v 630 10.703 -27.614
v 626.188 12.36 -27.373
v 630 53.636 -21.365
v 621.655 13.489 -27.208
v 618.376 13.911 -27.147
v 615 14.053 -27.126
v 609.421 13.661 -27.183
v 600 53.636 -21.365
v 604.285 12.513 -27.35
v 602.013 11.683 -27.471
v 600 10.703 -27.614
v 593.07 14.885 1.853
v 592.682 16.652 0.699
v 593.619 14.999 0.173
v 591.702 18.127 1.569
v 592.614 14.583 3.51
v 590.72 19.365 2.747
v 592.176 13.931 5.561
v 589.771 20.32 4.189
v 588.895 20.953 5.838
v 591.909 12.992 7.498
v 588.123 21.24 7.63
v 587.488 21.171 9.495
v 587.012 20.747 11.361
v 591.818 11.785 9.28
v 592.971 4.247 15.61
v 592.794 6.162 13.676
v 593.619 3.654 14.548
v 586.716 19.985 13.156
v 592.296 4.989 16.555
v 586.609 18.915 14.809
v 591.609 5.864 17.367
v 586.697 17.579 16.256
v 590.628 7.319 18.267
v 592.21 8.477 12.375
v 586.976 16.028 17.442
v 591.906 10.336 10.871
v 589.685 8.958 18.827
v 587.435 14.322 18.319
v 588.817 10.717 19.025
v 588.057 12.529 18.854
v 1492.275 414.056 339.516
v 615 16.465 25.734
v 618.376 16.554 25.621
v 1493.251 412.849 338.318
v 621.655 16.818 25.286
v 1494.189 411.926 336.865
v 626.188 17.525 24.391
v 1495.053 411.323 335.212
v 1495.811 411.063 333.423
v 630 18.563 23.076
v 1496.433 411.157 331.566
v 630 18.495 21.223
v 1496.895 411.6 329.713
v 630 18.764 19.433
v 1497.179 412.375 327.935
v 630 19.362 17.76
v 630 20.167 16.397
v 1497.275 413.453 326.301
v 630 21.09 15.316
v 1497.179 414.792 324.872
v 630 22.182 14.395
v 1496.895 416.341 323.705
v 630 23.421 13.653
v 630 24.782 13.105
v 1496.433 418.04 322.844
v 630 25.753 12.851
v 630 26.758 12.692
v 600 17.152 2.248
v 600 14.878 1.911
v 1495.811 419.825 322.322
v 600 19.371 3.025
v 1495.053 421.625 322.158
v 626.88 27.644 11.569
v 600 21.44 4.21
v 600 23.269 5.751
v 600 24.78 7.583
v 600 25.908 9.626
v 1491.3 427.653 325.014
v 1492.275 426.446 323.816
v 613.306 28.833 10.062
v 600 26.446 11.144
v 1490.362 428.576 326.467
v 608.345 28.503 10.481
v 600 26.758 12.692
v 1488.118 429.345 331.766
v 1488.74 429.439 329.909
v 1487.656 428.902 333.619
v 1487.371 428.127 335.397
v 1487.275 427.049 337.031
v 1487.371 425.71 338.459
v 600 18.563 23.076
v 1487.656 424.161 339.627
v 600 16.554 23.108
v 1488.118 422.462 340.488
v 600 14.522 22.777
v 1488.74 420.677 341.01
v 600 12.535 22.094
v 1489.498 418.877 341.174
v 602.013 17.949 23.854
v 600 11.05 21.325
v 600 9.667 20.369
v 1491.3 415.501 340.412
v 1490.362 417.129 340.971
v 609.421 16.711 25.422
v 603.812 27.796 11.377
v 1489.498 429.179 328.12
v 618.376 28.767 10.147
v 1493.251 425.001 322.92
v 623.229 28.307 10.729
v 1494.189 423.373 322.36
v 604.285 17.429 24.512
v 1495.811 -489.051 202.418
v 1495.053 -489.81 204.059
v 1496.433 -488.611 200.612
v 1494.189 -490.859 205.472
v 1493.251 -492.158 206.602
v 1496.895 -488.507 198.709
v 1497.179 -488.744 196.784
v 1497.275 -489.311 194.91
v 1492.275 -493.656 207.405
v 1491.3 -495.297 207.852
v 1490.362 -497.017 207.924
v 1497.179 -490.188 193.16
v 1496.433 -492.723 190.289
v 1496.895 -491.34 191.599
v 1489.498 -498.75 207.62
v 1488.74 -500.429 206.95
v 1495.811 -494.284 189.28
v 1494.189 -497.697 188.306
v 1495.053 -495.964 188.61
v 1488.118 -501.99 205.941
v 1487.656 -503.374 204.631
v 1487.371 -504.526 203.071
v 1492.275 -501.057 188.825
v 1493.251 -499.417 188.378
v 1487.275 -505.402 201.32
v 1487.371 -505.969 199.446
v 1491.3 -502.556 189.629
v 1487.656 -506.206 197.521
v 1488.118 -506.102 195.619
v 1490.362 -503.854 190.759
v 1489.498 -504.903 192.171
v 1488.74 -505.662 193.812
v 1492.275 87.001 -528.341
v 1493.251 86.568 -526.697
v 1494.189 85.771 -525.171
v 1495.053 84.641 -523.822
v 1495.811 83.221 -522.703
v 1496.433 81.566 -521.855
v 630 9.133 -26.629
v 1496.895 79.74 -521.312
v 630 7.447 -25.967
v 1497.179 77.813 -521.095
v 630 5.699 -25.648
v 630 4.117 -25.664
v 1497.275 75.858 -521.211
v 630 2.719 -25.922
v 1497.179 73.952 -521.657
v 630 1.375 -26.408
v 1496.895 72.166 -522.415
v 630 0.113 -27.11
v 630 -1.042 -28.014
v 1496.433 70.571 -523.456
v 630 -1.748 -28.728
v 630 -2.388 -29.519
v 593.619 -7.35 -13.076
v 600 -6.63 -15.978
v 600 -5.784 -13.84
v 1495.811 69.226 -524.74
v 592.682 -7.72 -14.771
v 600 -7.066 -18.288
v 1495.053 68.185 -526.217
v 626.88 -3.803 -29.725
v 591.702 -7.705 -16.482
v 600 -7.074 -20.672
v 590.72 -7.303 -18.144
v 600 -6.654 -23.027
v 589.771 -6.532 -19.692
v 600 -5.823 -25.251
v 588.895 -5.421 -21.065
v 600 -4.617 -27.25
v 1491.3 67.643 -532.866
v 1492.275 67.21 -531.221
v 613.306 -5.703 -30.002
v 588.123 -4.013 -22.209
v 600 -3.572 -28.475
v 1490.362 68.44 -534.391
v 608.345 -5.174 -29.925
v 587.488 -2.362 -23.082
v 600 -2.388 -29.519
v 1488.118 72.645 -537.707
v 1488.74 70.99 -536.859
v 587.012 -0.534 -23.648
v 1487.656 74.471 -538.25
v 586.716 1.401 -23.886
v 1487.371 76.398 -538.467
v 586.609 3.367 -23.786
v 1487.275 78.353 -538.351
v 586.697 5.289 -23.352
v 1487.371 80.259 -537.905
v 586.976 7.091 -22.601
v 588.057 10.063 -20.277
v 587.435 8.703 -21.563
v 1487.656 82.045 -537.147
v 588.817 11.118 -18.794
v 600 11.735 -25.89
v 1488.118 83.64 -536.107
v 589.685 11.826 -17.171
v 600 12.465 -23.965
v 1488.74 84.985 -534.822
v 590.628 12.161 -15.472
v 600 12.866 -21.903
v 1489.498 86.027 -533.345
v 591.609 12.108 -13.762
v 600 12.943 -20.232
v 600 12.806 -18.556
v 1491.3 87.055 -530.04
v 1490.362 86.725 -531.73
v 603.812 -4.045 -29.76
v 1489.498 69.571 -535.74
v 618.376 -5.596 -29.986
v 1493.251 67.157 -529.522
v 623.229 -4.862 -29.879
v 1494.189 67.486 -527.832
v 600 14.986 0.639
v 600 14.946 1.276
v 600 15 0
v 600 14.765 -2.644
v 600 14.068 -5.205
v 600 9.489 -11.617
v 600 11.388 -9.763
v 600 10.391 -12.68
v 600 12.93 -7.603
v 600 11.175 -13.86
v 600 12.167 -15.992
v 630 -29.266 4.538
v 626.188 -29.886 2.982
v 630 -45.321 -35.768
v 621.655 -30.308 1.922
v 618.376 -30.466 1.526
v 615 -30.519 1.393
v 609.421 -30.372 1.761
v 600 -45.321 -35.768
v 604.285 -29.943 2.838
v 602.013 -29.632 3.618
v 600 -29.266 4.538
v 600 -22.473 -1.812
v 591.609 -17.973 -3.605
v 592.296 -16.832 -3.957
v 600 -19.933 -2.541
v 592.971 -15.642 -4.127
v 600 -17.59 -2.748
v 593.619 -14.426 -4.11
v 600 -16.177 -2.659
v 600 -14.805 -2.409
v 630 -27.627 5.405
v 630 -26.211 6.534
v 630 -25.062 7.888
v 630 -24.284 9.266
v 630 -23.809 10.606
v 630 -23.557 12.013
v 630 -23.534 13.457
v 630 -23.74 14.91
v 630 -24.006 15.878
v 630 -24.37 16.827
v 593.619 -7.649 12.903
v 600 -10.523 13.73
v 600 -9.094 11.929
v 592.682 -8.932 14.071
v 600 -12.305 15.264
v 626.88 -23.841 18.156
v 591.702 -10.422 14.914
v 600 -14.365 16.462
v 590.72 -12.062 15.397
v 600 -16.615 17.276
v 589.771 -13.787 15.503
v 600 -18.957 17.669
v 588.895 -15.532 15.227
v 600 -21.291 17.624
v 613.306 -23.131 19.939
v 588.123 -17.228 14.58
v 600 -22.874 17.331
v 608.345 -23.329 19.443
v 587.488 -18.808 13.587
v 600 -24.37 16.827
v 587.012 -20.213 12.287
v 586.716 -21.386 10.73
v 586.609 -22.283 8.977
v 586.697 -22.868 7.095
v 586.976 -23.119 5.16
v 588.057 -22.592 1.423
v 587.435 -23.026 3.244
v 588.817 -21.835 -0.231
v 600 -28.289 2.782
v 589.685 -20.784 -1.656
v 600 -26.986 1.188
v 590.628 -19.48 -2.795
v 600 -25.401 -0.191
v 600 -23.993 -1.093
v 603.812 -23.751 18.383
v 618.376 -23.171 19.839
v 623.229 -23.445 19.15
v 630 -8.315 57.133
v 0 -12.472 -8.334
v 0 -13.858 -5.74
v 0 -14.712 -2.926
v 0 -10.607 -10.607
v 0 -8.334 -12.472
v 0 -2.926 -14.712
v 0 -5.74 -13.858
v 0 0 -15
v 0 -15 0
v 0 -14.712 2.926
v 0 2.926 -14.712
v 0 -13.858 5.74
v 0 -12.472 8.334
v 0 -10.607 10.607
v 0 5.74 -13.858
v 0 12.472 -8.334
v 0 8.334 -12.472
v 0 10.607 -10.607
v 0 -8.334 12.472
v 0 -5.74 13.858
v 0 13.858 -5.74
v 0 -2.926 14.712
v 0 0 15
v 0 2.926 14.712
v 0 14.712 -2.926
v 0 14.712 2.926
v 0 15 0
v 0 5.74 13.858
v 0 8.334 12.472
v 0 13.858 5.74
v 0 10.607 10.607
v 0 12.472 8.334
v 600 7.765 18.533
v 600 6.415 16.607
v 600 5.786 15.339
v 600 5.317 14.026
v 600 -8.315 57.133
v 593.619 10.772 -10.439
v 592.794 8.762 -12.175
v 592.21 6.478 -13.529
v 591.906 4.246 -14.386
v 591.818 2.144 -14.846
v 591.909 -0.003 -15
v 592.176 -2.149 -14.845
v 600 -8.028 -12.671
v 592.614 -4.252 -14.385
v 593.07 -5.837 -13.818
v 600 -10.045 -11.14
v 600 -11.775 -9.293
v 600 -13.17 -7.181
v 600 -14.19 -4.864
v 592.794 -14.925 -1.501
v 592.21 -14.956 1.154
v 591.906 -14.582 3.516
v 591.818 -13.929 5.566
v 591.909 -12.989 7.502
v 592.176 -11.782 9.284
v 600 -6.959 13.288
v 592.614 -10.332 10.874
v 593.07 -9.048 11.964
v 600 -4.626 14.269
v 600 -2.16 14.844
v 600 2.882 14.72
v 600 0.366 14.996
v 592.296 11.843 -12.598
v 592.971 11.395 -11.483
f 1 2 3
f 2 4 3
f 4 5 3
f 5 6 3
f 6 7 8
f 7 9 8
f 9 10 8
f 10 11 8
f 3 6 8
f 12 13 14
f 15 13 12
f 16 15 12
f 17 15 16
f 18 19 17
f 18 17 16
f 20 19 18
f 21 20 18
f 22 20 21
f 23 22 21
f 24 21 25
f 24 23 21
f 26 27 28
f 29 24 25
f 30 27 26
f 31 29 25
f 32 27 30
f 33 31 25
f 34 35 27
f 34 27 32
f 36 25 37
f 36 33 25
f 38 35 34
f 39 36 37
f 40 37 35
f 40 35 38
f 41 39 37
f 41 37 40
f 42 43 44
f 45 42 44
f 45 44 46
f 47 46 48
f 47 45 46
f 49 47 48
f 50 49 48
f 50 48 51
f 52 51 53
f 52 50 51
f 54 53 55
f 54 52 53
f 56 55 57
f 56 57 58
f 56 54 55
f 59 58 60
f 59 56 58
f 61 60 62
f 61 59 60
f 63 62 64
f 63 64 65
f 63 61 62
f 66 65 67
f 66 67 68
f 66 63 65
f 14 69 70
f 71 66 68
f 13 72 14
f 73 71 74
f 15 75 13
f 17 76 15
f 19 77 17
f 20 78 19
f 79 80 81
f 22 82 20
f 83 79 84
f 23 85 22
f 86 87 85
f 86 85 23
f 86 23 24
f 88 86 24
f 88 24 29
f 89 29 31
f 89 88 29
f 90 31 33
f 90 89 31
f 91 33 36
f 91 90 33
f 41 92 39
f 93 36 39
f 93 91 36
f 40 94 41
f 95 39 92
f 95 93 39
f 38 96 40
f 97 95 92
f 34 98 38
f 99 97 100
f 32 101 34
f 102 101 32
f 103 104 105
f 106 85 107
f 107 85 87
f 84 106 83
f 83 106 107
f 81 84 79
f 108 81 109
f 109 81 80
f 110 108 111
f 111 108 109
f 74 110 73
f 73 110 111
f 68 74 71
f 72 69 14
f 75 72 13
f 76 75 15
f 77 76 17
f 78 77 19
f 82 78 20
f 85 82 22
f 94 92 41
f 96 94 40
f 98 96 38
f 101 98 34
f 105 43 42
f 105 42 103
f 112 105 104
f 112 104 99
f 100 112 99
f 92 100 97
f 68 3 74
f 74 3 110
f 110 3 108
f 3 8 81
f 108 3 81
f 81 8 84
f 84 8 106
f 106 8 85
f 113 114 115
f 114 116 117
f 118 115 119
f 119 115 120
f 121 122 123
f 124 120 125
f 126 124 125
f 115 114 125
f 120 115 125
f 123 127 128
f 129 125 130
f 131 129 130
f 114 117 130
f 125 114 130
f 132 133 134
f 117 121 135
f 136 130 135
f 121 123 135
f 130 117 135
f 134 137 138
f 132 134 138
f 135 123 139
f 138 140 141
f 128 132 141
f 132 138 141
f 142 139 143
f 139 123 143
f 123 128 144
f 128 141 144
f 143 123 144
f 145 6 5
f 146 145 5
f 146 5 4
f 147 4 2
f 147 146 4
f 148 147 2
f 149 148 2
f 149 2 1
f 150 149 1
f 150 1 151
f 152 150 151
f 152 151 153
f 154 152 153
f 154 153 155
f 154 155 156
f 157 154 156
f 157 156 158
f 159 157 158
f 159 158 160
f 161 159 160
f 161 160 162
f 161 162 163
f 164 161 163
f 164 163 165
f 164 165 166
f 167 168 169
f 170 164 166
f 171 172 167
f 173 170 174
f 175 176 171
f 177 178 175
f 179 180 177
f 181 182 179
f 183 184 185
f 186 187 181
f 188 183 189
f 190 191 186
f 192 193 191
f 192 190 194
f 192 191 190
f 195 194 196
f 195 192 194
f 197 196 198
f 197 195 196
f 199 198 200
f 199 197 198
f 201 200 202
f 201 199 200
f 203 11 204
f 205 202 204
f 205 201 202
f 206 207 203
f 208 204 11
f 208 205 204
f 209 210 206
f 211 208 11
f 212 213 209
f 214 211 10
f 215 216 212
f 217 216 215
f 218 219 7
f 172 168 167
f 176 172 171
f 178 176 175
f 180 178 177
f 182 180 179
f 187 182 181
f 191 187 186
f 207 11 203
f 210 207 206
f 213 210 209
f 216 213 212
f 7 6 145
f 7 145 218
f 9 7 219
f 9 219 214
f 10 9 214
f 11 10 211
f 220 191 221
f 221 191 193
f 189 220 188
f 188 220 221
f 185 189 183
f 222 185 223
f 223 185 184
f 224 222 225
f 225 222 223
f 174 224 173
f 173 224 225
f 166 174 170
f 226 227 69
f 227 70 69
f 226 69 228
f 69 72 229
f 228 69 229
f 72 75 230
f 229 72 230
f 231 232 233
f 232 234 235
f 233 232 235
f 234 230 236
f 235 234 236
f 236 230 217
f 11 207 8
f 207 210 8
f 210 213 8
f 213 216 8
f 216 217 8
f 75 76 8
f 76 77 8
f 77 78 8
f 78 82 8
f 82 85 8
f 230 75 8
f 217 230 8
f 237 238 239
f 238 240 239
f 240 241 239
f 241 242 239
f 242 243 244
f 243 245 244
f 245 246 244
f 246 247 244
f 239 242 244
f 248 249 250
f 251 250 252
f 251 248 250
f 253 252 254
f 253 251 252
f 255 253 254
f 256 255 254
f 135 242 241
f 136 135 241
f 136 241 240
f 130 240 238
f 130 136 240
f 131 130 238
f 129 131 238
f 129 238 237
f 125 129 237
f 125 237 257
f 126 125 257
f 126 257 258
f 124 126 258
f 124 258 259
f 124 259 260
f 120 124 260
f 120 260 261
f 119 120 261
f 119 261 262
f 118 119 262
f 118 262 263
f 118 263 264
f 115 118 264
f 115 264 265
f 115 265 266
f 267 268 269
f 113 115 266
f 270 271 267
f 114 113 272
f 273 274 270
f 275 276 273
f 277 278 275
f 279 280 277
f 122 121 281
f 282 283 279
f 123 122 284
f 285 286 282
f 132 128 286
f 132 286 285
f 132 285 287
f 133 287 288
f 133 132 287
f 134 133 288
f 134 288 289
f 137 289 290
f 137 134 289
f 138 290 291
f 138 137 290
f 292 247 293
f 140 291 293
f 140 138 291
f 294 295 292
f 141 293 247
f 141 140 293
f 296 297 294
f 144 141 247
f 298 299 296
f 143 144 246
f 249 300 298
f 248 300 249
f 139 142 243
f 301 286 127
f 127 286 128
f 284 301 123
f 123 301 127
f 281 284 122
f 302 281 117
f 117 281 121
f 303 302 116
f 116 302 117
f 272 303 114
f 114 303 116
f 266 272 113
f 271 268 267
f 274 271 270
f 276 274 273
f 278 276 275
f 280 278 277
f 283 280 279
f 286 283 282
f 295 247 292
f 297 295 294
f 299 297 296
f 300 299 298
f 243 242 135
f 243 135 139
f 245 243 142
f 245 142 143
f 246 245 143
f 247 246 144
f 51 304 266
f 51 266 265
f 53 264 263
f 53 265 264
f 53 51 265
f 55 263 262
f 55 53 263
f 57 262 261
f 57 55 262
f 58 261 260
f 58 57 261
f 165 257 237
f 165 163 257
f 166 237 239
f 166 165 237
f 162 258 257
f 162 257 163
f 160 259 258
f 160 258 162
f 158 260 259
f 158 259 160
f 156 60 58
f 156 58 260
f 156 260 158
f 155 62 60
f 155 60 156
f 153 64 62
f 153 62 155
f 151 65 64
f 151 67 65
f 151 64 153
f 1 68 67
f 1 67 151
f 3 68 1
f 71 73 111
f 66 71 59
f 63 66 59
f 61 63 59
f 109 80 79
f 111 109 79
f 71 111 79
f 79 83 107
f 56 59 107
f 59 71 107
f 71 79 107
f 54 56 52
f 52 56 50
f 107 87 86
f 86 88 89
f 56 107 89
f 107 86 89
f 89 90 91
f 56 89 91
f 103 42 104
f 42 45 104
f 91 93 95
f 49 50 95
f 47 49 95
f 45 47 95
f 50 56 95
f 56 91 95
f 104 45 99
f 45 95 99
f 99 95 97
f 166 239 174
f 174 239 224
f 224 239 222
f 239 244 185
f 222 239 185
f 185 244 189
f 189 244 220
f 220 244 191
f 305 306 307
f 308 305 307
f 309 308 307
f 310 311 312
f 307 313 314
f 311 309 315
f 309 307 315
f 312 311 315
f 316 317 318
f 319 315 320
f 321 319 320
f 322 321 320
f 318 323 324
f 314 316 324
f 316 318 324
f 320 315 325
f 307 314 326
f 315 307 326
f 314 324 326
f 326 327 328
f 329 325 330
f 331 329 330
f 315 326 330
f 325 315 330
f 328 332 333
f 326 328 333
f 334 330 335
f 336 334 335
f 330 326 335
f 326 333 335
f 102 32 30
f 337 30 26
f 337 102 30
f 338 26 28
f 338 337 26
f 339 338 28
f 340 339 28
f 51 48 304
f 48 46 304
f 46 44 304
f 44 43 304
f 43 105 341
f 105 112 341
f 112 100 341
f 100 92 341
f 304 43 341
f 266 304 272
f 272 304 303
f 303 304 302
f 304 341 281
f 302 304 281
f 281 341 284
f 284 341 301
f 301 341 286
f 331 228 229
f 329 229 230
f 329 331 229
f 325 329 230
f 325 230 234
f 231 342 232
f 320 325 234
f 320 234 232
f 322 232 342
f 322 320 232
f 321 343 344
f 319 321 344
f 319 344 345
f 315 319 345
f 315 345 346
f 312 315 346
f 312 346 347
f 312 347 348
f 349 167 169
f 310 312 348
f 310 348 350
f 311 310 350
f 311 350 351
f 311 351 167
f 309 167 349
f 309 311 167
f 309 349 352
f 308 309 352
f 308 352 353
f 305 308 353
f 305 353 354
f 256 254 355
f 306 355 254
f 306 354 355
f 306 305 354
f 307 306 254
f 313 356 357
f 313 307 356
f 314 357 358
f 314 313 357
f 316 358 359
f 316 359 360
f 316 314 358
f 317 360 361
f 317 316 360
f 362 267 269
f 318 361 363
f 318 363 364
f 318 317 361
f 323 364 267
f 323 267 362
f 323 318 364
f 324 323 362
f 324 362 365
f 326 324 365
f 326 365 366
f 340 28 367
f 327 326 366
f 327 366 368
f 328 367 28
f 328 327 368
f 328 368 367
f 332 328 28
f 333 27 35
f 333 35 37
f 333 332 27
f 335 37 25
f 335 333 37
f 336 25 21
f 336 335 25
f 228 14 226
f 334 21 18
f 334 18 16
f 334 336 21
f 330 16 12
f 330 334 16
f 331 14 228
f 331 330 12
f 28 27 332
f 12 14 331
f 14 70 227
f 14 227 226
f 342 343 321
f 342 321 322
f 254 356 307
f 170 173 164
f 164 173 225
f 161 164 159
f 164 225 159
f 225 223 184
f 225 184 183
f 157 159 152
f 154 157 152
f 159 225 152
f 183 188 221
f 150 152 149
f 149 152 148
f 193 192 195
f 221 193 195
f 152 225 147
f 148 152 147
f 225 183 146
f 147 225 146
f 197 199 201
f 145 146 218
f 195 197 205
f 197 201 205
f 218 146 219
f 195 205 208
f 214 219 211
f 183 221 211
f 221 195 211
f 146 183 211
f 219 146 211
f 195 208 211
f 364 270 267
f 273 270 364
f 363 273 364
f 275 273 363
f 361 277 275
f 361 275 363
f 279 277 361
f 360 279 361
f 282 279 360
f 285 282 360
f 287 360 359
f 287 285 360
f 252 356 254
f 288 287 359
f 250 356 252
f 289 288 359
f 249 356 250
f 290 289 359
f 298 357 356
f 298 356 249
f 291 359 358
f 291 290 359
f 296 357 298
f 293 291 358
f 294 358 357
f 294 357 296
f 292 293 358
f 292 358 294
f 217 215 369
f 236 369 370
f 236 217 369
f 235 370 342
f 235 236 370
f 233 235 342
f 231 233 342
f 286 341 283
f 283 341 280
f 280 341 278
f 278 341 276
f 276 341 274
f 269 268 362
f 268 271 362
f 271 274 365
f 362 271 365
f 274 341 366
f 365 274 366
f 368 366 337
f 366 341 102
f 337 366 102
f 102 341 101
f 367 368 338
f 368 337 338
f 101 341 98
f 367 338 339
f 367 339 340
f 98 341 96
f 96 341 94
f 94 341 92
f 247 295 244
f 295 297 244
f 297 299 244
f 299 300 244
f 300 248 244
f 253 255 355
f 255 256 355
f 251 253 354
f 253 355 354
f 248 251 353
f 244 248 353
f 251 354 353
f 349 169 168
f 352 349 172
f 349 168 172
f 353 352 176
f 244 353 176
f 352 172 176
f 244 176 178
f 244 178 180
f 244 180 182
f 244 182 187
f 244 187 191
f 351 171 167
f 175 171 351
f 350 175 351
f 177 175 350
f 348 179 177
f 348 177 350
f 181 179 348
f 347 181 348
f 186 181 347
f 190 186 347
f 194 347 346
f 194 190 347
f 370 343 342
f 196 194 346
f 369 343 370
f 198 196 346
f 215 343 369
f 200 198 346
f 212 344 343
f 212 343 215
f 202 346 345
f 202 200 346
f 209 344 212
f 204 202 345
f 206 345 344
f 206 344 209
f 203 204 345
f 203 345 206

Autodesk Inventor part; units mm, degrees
sketch "Esquisse2" plane through (0, 0, 0) normal (1, 0, 0) x (0, 1, 0)
  circle A0 centre (0, 0) radius 15
  dimension "d3" = 30
extrude "Extrusion1" add sketch "Esquisse2" along normal blind 600
sketch "Esquisse3" plane through (600, 0, 0) normal (1, 0, 0) x (0, 0, -1)
  circle A0 centre (0, 0) radius 15 construction
  line L0 (35.7678, -45.3211) -> (21.3653, 53.6363)
  line L1 (21.3653, 53.6363) -> (-57.1331, -8.3153)
  line L2 (-57.1331, -8.3153) -> (35.7678, -45.3211)
  line L3 (54.348, 0) -> (-75.7133, 0) construction
  dimension "d12" = 60
  dimension "d13" = 60
  dimension "d14" = 60
  dimension "d16" = 100
  dimension "d17" = 86.6025
  dimension "d18" = 28.8675
  dimension "d19" = 28.8675
  dimension "d20" = 28.8675
  dimension "d21" = 38.281
extrude "Extrusion2" add sketch "Esquisse3" along normal blind 30
ref_plane "Plan de construction1" through (630, -8.3153, 57.1331) normal (-0.8660254, 0.4645044, -0.1850289) x (0, -0.3700577, -0.9290088)
ref_plane "Plan de construction2" through (630, -45.3211, -35.7678) normal (-0.8660254, -0.0720125, 0.494787) x (0, 0.989574, 0.144025)
ref_plane "Plan de construction3" through (630, 53.6363, -21.3653) normal (-0.8660254, -0.3924919, -0.3097582) x (0, -0.6195163, 0.7849838)
sketch "Esquisse4" plane through (630, -45.3211, -35.7678) normal (-0.8660254, -0.0720125, 0.494787) x (0, 0.989574, 0.144025)
  line L0 (0, 15) -> (100, 15) construction
  line L1 (100, 15) -> (100, 0) construction
  line L2 (0, 0) -> (100, 0) construction
  line L3 (0, 15) -> (0, 0) construction
  circle A0 centre (50, 7.5) radius 10
  line L4 (50, 753.3118) -> (50, -218.5479) construction
  point P0 (50, 290)
  dimension "d25" = 20
  dimension "d26" = 15
  dimension "d27" = 7.5
extrude "Extrusion3" add sketch "Esquisse4" along normal blind 40 and the other way blind 1000
sketch "Esquisse5" plane through (630, 53.6363, -21.3653) normal (-0.8660254, -0.3924919, -0.3097582) x (0, -0.6195163, 0.7849838)
  line L0 (0, 15) -> (100, 15) construction
  line L1 (100, 15) -> (100, 0) construction
  line L2 (0, 0) -> (100, 0) construction
  line L3 (0, 15) -> (0, 0) construction
  circle A0 centre (50, 7.5) radius 10
  line L4 (50, 845.2082) -> (50, -1048.939) construction
  point P0 (50, 290)
  dimension "d32" = 20
  dimension "d33" = 7.5
extrude "Extrusion4" add sketch "Esquisse5" along normal blind 40 and the other way blind 1000
sketch "Esquisse6" plane through (630, -8.3153, 57.1331) normal (-0.8660254, 0.4645044, -0.1850289) x (0, -0.3700577, -0.9290088)
  line L0 (0, 15) -> (100, 15) construction
  line L1 (100, 15) -> (100, 0) construction
  line L2 (0, 0) -> (100, 0) construction
  line L3 (0, 15) -> (0, 0) construction
  circle A0 centre (50, 7.5) radius 10
  line L4 (50, 943.564) -> (50, -1296.7643) construction
  point P0 (50, 290)
  dimension "d38" = 20
  dimension "d39" = 7.5
extrude "Extrusion5" add sketch "Esquisse6" along normal blind 40 and the other way blind 1000
equation "\"d18\" = 0.333333 * d17"
equation "\"d19\" = 0.333333 * d17"
equation "\"d27\" = 0.5 * d26"
properties part number "P003_tripod"
